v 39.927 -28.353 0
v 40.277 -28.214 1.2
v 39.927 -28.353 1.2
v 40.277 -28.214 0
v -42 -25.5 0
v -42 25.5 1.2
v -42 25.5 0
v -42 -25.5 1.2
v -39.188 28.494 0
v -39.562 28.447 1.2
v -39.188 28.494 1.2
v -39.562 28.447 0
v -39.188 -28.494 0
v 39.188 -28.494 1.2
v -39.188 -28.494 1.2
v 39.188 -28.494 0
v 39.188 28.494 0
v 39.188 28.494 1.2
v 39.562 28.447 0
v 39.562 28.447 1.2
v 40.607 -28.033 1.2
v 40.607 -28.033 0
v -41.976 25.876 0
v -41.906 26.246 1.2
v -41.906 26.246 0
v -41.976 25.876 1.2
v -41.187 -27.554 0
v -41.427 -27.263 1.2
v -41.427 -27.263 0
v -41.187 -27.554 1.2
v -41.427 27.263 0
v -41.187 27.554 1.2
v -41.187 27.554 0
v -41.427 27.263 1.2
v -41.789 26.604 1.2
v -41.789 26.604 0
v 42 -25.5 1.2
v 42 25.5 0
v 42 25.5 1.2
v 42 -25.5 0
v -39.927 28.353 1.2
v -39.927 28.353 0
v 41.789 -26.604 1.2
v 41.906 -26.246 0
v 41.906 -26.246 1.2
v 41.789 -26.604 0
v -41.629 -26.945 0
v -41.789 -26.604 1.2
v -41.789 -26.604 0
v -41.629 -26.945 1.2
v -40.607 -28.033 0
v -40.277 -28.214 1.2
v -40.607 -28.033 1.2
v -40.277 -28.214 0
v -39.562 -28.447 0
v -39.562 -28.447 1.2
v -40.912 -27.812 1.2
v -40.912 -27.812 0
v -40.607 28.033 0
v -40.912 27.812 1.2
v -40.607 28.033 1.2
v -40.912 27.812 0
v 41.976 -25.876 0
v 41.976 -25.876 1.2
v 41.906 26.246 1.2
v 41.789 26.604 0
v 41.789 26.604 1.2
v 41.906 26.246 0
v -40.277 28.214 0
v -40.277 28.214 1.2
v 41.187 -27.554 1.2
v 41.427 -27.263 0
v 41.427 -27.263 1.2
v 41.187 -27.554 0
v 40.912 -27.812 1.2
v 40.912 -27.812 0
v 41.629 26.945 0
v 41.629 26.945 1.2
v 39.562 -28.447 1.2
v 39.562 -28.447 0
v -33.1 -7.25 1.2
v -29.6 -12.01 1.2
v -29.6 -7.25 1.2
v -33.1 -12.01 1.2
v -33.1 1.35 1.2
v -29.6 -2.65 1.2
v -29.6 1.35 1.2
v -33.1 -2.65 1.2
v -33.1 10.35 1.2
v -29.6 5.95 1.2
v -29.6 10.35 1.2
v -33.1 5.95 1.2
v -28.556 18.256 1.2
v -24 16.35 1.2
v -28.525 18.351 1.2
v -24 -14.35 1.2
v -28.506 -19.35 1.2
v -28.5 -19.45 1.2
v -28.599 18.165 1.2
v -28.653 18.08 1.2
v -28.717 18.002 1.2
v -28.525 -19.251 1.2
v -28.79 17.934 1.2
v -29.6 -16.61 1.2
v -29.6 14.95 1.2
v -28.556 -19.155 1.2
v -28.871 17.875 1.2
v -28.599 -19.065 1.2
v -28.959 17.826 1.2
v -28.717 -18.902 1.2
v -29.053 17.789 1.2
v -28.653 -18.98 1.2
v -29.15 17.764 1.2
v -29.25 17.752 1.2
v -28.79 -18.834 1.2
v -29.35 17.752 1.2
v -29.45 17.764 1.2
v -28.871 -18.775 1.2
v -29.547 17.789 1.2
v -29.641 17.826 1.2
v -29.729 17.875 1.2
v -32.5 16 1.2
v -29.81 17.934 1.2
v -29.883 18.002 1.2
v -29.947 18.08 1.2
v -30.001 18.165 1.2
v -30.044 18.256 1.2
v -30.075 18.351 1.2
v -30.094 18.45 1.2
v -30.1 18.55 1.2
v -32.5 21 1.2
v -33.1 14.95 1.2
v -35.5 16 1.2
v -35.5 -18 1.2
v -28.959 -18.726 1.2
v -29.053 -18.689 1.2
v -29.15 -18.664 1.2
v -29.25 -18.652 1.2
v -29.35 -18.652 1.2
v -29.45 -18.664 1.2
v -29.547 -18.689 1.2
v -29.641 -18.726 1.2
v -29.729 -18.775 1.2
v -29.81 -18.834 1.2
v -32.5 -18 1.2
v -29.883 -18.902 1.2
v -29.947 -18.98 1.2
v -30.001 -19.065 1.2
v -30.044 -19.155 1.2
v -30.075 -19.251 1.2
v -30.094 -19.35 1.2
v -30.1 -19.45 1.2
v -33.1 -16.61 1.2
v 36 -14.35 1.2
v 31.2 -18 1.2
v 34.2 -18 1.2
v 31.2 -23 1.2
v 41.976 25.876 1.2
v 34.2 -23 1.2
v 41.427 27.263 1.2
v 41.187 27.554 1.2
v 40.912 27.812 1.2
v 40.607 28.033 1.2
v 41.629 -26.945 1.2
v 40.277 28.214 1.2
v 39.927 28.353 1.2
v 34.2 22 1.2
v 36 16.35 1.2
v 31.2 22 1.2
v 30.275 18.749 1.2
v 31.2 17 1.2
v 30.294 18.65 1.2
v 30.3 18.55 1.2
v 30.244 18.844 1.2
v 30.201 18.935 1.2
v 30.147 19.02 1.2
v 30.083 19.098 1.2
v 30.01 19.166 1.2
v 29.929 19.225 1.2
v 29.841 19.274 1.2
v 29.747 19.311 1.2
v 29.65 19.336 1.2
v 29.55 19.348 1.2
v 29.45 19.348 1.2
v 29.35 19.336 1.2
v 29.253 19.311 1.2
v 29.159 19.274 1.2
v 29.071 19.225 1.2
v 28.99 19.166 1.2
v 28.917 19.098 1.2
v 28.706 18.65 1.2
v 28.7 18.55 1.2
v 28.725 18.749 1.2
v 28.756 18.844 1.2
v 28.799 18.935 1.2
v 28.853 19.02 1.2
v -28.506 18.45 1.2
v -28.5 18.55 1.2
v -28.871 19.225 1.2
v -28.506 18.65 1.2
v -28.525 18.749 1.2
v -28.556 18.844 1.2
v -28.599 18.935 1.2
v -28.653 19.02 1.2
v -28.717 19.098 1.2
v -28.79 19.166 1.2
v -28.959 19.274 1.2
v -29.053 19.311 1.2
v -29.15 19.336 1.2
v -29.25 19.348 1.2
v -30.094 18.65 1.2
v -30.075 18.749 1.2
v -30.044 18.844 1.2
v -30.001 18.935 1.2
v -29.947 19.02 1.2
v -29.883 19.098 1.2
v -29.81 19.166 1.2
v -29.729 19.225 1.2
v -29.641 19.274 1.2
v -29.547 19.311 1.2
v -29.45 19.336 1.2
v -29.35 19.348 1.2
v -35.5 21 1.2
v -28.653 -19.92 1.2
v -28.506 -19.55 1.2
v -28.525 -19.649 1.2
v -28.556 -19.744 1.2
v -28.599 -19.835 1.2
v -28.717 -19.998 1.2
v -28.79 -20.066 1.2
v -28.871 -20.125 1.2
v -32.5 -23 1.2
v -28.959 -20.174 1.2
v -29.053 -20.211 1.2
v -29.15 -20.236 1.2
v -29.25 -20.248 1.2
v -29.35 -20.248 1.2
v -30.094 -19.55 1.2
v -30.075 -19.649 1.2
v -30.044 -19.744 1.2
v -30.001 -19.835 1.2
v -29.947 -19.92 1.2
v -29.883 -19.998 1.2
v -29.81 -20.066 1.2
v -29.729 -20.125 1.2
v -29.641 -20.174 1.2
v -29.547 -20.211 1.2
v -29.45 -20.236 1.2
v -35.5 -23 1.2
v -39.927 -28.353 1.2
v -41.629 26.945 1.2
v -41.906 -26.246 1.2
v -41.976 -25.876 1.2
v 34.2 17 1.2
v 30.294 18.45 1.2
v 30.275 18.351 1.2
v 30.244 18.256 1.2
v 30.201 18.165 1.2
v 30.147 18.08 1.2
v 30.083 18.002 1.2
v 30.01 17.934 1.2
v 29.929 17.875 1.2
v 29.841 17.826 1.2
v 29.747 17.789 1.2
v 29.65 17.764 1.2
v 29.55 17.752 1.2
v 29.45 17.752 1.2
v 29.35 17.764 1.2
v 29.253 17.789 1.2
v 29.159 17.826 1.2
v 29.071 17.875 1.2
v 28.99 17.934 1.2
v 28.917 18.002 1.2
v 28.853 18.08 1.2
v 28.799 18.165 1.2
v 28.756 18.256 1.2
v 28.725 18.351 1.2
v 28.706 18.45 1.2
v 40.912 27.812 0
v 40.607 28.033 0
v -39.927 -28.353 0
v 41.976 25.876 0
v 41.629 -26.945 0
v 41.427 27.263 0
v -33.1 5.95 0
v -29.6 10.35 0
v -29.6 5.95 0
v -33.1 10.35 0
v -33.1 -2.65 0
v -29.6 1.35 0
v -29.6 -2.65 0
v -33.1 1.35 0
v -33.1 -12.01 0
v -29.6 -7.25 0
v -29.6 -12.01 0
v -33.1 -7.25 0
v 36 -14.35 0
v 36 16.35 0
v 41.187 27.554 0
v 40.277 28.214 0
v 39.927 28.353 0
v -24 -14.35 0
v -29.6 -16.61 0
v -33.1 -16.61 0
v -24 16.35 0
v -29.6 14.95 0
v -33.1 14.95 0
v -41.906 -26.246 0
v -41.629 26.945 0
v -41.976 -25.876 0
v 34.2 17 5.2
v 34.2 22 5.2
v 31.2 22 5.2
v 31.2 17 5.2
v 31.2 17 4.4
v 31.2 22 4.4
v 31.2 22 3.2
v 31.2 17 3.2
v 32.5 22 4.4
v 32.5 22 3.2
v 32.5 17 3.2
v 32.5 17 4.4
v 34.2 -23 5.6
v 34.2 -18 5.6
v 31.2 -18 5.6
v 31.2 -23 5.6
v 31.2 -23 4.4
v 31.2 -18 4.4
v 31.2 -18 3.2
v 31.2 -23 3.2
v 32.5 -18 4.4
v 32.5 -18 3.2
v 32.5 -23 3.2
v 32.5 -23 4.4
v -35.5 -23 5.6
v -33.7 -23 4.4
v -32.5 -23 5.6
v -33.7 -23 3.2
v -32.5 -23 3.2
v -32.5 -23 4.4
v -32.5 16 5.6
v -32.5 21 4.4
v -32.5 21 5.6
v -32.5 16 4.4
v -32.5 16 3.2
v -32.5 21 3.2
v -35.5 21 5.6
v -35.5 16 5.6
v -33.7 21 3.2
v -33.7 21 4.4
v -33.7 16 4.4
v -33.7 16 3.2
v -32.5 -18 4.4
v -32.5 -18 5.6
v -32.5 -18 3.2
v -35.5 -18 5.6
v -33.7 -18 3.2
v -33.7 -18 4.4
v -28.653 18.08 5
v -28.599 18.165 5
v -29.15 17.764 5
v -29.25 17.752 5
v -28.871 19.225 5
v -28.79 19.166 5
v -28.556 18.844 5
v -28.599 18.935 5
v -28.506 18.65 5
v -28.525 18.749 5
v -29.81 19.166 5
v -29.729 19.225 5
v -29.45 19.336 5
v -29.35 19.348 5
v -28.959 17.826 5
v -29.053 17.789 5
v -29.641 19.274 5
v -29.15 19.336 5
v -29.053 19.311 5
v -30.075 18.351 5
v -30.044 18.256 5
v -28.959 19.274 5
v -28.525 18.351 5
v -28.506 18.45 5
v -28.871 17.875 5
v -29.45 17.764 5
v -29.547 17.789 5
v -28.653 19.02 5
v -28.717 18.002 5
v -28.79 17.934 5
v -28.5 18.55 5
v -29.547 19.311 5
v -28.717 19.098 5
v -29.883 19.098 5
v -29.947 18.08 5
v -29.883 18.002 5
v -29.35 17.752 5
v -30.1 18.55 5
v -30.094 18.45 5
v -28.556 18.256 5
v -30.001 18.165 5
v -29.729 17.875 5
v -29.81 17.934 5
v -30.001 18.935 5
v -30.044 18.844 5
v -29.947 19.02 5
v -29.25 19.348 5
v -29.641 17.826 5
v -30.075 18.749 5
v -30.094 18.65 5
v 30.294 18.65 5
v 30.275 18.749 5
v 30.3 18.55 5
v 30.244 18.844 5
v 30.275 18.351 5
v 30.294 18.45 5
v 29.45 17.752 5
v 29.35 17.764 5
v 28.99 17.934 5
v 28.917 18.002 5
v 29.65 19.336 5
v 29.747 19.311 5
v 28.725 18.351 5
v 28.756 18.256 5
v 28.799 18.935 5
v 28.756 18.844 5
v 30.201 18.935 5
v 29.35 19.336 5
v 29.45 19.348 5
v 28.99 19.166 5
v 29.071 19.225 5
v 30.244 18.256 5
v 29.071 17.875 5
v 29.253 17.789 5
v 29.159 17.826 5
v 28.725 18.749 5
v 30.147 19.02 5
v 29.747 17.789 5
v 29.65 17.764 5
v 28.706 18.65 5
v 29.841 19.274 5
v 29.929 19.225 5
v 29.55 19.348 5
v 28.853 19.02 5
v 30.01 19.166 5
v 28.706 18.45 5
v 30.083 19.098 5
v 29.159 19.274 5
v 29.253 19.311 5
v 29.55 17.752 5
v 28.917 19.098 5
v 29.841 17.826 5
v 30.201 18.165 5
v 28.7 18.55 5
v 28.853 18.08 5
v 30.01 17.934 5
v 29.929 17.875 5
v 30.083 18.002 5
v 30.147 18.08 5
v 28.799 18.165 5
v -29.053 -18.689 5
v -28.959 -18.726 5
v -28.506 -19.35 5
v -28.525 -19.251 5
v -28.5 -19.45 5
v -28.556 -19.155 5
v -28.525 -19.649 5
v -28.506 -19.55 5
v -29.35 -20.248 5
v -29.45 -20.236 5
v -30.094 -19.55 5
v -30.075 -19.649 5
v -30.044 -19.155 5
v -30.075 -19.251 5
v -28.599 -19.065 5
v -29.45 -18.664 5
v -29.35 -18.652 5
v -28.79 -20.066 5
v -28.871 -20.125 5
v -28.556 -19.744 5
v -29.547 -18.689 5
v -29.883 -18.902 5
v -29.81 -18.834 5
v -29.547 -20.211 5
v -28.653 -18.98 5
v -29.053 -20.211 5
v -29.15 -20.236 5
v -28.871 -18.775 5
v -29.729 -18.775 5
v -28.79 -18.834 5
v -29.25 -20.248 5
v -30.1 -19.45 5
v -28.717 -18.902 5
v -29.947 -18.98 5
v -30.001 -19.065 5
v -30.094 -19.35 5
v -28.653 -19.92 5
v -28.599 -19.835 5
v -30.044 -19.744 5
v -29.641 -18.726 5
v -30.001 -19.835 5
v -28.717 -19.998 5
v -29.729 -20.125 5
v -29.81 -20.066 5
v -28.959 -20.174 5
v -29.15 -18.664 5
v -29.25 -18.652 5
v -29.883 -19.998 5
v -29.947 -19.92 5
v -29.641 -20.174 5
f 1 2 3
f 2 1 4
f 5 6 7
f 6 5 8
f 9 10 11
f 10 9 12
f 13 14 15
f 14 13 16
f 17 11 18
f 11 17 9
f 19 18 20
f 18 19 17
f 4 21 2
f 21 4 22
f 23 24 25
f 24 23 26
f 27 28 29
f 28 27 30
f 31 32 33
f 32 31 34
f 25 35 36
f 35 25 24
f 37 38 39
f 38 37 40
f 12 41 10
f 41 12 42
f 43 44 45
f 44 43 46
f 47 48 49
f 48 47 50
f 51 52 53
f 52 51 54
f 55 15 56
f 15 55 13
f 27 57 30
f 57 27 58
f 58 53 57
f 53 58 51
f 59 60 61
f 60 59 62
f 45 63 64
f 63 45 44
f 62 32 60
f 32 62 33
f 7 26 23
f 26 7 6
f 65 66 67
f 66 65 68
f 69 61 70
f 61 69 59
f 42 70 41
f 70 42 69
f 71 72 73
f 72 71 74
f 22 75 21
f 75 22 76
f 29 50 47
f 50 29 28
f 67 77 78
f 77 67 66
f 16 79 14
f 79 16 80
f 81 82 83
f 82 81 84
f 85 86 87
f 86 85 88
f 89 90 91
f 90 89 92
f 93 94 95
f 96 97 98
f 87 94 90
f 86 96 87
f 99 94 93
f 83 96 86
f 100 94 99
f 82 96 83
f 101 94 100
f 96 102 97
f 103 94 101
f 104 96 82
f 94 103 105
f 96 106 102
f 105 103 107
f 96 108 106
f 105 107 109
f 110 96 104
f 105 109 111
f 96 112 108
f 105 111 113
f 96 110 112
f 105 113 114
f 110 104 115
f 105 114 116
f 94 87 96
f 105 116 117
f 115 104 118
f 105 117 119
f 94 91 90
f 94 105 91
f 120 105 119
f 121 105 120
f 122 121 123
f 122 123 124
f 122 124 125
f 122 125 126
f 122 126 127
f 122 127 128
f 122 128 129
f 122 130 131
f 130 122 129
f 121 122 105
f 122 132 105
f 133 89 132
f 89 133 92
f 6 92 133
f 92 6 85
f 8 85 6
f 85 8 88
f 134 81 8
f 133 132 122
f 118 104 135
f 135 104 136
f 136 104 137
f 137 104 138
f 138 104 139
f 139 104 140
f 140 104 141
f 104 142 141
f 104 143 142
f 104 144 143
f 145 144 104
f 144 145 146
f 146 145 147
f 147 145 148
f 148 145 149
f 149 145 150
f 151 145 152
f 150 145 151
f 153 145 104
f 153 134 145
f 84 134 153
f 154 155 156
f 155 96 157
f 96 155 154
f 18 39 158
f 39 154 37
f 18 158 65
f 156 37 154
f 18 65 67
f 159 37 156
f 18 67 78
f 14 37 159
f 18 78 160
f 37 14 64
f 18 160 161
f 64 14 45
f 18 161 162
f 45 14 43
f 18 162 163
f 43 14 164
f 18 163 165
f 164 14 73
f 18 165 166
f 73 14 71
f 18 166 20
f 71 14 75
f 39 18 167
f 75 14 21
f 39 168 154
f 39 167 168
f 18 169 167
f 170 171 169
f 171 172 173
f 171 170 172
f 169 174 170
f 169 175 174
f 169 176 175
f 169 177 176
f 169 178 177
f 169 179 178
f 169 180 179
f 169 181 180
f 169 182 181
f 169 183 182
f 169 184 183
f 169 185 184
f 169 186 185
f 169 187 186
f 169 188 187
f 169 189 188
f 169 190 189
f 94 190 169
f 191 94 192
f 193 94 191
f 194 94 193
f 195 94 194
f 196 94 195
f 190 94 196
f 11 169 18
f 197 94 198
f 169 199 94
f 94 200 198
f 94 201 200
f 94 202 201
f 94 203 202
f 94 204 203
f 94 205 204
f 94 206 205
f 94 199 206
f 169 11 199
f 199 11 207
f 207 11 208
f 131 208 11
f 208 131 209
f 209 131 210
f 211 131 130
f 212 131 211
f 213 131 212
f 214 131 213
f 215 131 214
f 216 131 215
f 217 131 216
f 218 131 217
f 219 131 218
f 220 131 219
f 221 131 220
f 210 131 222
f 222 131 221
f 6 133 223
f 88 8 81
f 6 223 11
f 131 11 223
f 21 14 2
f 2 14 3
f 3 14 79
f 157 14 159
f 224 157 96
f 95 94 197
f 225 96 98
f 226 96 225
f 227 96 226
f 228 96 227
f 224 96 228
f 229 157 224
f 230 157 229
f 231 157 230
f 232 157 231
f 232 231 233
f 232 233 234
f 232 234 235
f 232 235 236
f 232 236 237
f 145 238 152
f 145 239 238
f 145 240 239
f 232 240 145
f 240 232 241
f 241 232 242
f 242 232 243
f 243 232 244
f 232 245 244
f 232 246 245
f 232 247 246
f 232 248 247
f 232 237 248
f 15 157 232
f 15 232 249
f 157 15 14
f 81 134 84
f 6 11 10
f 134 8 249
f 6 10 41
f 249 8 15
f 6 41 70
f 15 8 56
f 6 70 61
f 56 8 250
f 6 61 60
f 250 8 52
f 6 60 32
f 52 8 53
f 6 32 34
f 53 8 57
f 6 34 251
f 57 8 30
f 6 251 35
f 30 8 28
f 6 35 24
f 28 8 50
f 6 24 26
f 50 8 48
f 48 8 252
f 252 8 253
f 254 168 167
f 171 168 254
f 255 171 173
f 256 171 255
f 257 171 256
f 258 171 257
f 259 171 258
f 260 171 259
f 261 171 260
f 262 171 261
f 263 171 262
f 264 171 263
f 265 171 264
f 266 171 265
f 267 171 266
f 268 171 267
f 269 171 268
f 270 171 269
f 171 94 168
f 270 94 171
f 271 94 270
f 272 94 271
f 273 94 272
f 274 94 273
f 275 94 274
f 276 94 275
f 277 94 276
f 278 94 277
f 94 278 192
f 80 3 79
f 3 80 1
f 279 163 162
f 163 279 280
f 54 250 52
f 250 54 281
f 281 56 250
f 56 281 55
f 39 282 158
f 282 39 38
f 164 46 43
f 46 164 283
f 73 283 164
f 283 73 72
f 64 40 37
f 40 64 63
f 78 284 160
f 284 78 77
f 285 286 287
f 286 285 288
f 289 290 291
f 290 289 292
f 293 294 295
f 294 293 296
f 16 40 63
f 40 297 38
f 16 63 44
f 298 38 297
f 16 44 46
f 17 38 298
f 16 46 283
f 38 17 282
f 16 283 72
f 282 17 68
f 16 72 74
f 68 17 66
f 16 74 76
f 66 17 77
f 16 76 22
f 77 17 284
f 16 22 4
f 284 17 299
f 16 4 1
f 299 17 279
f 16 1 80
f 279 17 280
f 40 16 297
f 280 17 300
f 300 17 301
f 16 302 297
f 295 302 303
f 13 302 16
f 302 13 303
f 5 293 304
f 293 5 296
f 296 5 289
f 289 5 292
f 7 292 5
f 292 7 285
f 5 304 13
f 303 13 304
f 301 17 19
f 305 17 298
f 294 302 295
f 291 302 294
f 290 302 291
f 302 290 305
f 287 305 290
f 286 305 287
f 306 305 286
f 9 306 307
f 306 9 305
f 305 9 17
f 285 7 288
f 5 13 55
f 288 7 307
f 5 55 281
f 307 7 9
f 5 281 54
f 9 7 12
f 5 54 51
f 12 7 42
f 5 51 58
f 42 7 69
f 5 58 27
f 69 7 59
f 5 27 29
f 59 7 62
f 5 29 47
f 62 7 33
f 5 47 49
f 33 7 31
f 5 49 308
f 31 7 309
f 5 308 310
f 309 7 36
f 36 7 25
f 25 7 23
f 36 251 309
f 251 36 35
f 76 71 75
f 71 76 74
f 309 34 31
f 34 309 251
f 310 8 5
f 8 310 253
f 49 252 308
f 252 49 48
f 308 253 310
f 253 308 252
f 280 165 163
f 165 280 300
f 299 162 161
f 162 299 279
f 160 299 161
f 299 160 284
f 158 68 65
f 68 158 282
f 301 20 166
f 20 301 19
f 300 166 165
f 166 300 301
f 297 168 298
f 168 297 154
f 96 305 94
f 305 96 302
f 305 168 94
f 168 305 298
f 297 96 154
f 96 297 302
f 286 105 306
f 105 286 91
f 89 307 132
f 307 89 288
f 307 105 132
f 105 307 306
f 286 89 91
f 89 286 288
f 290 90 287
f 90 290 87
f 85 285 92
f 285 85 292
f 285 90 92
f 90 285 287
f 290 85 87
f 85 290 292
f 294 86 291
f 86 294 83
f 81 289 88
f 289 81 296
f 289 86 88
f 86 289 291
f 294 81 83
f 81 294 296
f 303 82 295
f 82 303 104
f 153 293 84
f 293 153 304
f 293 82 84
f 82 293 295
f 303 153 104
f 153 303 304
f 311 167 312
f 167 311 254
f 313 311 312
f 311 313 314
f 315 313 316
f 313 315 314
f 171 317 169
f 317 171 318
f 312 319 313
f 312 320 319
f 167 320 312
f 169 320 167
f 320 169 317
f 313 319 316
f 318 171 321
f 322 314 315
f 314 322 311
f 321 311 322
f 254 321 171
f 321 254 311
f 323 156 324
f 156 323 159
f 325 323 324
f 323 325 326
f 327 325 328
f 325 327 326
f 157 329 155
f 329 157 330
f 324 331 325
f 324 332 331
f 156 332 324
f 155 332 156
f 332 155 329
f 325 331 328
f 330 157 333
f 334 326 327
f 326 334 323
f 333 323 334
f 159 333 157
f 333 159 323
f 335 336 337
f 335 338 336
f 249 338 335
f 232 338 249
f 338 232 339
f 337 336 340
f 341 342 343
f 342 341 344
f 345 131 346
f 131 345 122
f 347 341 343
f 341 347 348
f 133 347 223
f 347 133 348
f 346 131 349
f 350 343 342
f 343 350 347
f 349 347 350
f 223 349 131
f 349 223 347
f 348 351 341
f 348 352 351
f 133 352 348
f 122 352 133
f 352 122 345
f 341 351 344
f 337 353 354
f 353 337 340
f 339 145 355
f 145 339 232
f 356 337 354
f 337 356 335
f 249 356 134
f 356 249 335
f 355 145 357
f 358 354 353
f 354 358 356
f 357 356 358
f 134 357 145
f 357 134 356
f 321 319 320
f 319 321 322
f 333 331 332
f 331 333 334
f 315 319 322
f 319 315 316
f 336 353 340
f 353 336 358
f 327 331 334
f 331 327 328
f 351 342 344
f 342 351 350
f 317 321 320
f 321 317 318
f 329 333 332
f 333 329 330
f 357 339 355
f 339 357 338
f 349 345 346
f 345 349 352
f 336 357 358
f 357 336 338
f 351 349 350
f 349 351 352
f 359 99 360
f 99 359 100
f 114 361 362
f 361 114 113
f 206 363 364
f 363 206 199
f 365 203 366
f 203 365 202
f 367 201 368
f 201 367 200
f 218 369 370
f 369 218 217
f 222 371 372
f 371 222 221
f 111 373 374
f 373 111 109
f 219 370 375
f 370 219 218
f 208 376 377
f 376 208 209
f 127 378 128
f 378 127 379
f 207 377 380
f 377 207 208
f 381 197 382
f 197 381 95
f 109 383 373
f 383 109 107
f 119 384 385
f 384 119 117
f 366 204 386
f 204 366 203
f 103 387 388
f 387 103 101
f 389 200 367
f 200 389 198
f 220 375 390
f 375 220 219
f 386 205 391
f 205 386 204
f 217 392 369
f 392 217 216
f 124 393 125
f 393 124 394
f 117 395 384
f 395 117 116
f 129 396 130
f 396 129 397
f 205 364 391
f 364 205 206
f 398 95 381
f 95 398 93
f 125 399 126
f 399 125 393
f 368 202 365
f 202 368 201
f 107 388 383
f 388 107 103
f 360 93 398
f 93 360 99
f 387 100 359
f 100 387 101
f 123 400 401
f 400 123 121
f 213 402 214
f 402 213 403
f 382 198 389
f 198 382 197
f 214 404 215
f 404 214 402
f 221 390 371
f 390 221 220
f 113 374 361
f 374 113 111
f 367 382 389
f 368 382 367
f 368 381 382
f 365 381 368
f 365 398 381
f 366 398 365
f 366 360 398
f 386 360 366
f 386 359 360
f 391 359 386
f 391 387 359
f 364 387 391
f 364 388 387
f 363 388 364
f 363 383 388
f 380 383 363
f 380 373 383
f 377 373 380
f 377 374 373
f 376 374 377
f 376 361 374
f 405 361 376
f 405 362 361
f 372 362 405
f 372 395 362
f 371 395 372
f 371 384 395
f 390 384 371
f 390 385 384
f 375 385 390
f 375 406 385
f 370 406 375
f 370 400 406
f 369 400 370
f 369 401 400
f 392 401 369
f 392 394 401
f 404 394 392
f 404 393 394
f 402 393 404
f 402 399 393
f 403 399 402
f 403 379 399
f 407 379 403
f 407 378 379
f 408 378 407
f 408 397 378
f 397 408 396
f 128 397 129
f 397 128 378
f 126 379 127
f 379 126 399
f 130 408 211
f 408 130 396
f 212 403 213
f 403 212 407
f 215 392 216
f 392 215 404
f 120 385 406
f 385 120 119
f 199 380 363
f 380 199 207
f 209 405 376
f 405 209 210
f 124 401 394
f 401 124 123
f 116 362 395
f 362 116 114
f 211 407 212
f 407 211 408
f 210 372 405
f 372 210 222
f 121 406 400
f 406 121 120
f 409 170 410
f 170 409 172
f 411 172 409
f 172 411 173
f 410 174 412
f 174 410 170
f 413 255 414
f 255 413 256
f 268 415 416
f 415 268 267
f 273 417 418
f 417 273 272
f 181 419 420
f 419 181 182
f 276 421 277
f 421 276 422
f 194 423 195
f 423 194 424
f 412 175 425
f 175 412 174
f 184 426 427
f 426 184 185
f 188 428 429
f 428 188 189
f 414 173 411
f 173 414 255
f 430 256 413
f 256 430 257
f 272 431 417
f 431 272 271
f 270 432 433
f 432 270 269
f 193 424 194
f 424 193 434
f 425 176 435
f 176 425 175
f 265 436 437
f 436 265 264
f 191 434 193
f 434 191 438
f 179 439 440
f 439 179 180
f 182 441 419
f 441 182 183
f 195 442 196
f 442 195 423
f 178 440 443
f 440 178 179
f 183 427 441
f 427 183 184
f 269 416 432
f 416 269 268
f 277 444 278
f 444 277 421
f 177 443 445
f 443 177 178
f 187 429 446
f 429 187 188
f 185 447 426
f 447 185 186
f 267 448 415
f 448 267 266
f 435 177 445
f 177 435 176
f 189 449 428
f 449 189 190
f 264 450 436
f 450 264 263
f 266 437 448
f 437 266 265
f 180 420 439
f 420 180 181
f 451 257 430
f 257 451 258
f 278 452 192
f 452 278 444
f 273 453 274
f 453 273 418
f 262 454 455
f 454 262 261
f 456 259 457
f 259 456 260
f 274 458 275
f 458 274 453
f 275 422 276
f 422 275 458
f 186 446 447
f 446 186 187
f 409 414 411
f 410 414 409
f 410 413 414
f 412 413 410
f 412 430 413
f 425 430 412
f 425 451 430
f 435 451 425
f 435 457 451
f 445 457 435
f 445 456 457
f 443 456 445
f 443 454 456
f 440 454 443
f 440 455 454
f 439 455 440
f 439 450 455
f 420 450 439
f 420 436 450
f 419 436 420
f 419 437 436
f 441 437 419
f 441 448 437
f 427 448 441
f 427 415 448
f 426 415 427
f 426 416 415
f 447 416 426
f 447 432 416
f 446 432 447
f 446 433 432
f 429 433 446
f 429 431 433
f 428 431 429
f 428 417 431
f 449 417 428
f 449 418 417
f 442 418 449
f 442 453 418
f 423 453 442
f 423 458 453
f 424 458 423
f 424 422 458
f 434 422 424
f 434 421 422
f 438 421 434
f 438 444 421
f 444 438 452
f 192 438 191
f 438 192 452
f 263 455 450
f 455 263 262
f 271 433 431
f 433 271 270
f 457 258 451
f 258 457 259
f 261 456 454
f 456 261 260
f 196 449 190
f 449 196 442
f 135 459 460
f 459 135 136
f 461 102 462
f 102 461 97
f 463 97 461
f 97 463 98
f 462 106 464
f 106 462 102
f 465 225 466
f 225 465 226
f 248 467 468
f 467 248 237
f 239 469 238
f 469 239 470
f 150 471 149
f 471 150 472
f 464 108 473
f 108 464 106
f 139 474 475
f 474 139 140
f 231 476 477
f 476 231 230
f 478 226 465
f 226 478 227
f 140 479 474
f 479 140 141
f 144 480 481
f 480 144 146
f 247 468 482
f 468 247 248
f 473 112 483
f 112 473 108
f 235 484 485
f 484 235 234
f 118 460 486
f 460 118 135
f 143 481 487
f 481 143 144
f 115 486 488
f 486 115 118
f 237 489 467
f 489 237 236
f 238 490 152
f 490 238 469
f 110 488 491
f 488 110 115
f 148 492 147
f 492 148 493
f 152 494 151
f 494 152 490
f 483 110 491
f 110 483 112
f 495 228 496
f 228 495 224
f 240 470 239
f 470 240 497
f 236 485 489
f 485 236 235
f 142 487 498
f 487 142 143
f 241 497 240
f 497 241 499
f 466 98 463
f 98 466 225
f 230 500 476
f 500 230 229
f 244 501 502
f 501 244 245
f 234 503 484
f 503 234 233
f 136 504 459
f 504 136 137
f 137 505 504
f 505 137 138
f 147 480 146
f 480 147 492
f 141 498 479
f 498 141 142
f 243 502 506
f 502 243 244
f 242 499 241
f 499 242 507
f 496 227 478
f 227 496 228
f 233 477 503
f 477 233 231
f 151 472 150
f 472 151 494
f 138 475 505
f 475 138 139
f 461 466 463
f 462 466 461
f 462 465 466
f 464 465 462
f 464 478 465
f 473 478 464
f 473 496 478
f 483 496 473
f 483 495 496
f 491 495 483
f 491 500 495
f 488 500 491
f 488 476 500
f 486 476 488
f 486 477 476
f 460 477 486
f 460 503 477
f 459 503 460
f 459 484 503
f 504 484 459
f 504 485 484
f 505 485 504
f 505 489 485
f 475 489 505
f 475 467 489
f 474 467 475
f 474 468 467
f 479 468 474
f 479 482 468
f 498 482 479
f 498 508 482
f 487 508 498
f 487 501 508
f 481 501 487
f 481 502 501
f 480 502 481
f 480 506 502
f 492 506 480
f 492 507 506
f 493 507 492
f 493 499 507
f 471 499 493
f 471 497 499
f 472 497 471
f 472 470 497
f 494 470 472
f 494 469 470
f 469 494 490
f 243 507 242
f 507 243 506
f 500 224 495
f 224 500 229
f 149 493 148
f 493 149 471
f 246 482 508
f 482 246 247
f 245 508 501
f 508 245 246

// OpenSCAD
$fn=50;
module top(x, y, z, cham=3) {
    oy = y-cham*2;
    ox = x-cham*2;
        hull() {
            translate([-ox/2,-oy/2,0]) cylinder(h=z,r=cham);
            translate([-ox/2,oy/2,0]) cylinder(h=z,r=cham);
            translate([ox/2,-oy/2,0]) cylinder(h=z,r=cham);
            translate([ox/2,oy/2,0]) cylinder(h=z,r=cham);
        }
}
th=1.2;
difference() {
    translate([0,0,0]) top(84,57,th);
    translate([6,1,0]) cube([60,30.7,5],true);
    translate([-33.1,10.35,0]) cube([3.5,4.6,th]);    
    translate([-33.1,1.35,0]) cube([3.5,4.6,th]);
    translate([-33.1,-7.25,0]) cube([3.5,4.6,th]);
    translate([-33.1,-16.61,0]) cube([3.5,4.6,th]);
}

// set pins
translate([-29.3,18.55,0]) cylinder(h=5,r=0.8);
translate([29.5,18.55,0]) cylinder(h=5,r=0.8);
translate([-29.3,-19.45,0]) cylinder(h=5,r=0.8);
// posts
difference() {
  union() {  
    translate([31.2,17,0]) cube([3,5,5.2]);
    translate([31.2,-23,0]) cube([3,5,5.6]);
    translate([-35.5,16,0]) cube([3,5,5.6]);
    translate([-35.5,-23,0]) cube([3,5,5.6]);
  }
  translate([-35.5+1.8,-23,3.2]) cube([66.2,45,1.2]);
}
